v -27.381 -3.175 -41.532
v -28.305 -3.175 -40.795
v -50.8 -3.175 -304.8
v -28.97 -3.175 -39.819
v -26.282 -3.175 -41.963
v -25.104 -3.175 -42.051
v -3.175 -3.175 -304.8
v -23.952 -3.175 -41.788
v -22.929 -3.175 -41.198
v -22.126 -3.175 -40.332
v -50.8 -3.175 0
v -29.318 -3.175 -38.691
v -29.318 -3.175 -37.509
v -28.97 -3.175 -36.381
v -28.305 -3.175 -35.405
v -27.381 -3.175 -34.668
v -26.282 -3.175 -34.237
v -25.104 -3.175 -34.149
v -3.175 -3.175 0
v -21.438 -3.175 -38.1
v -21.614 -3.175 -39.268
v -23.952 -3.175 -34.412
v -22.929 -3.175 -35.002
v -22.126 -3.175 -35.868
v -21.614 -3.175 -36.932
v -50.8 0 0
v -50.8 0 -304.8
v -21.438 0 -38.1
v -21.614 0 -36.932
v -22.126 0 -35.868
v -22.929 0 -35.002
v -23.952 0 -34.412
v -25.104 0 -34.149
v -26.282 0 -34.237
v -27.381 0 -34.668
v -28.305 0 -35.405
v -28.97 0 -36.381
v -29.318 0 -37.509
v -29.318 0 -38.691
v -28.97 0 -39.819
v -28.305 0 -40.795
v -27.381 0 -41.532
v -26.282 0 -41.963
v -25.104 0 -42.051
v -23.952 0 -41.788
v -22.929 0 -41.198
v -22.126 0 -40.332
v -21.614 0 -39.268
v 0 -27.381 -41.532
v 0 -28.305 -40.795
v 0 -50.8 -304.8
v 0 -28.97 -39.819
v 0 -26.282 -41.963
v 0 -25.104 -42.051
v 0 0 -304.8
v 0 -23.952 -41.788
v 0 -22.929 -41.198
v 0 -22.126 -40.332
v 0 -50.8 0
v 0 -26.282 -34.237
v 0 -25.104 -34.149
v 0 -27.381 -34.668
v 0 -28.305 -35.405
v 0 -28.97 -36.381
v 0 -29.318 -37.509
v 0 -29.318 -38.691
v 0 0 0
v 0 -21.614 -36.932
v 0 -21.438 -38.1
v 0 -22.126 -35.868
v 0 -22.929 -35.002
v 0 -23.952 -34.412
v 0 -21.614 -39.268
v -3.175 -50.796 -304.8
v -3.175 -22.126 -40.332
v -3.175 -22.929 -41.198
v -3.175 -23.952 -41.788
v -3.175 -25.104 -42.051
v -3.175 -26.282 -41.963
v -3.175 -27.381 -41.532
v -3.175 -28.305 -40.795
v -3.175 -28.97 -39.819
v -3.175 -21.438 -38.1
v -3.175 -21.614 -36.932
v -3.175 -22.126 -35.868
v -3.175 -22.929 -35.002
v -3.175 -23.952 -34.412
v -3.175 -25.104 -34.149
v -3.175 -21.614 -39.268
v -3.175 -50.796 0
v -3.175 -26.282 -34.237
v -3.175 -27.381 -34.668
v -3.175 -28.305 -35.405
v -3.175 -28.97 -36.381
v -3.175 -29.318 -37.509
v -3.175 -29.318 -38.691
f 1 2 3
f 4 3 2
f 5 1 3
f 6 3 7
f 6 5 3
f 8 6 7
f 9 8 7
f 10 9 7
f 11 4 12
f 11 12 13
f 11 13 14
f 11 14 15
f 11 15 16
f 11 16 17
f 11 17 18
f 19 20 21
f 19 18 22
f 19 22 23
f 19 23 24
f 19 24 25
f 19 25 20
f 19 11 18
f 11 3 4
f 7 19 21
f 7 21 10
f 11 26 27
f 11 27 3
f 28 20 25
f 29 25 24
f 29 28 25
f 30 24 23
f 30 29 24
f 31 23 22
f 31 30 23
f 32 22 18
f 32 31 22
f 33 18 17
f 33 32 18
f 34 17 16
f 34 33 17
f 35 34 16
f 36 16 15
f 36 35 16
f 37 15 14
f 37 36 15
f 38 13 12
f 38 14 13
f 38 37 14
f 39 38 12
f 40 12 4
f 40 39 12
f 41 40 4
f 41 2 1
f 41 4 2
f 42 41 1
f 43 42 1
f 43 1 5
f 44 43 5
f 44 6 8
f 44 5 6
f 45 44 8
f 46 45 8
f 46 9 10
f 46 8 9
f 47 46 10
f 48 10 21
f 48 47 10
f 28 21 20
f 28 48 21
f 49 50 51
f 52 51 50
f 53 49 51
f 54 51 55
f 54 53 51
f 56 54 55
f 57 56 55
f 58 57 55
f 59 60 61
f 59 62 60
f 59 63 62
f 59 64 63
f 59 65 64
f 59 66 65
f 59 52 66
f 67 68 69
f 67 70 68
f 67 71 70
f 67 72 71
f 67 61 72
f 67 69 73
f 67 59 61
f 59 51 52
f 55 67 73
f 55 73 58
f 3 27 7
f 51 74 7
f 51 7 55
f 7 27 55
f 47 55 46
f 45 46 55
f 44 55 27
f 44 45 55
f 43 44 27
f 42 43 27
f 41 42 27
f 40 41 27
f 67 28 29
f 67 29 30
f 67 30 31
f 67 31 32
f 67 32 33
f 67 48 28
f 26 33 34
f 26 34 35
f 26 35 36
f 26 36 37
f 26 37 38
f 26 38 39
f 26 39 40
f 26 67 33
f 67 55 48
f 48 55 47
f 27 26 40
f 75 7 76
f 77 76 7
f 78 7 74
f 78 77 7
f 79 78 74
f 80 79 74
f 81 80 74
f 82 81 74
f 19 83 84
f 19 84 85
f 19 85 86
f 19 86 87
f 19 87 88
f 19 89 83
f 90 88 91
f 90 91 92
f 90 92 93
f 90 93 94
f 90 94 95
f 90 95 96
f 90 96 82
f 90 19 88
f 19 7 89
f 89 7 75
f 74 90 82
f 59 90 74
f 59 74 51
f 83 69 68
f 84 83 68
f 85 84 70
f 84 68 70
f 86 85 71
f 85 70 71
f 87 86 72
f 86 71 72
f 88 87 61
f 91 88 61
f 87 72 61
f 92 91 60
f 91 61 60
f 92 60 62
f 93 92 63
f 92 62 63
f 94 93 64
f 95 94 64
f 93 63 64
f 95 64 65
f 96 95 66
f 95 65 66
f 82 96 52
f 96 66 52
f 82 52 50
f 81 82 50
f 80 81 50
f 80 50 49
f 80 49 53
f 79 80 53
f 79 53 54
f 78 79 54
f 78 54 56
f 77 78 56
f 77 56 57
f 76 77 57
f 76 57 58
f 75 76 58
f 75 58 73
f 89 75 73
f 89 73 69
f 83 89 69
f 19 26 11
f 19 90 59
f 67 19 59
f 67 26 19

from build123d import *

# Parameters (mm, degrees)
F1_DEPTH = 304.8
F2_R     = 3.9624
F3_DEPTH = 50.801
F4_R     = 3.9624
F5_DEPTH = 50.801


with BuildPart() as f1:
    # F0 (on Top) → F1 (new body)
    with BuildSketch(Plane.XY):
        Polygon((0, 0), (-50.8, 0), (-50.8, -3.175), (-3.175, -3.175), (-3.175, -50.795514), (0, -50.8), align=None)
    extrude(amount=-F1_DEPTH)

    # F2 (on Right) → F3 (cut, through all)
    with BuildSketch(Plane.YZ):
        with Locations((-25.4, -38.1)):
            Circle(F2_R)
    extrude(amount=-F3_DEPTH, mode=Mode.SUBTRACT)

    # F4 (on Front) → F5 (cut, through all)
    with BuildSketch(Plane.XZ):
        with Locations((-25.4, -38.1)):
            Circle(F4_R)
    extrude(amount=F5_DEPTH, mode=Mode.SUBTRACT)


solid = f1.part
